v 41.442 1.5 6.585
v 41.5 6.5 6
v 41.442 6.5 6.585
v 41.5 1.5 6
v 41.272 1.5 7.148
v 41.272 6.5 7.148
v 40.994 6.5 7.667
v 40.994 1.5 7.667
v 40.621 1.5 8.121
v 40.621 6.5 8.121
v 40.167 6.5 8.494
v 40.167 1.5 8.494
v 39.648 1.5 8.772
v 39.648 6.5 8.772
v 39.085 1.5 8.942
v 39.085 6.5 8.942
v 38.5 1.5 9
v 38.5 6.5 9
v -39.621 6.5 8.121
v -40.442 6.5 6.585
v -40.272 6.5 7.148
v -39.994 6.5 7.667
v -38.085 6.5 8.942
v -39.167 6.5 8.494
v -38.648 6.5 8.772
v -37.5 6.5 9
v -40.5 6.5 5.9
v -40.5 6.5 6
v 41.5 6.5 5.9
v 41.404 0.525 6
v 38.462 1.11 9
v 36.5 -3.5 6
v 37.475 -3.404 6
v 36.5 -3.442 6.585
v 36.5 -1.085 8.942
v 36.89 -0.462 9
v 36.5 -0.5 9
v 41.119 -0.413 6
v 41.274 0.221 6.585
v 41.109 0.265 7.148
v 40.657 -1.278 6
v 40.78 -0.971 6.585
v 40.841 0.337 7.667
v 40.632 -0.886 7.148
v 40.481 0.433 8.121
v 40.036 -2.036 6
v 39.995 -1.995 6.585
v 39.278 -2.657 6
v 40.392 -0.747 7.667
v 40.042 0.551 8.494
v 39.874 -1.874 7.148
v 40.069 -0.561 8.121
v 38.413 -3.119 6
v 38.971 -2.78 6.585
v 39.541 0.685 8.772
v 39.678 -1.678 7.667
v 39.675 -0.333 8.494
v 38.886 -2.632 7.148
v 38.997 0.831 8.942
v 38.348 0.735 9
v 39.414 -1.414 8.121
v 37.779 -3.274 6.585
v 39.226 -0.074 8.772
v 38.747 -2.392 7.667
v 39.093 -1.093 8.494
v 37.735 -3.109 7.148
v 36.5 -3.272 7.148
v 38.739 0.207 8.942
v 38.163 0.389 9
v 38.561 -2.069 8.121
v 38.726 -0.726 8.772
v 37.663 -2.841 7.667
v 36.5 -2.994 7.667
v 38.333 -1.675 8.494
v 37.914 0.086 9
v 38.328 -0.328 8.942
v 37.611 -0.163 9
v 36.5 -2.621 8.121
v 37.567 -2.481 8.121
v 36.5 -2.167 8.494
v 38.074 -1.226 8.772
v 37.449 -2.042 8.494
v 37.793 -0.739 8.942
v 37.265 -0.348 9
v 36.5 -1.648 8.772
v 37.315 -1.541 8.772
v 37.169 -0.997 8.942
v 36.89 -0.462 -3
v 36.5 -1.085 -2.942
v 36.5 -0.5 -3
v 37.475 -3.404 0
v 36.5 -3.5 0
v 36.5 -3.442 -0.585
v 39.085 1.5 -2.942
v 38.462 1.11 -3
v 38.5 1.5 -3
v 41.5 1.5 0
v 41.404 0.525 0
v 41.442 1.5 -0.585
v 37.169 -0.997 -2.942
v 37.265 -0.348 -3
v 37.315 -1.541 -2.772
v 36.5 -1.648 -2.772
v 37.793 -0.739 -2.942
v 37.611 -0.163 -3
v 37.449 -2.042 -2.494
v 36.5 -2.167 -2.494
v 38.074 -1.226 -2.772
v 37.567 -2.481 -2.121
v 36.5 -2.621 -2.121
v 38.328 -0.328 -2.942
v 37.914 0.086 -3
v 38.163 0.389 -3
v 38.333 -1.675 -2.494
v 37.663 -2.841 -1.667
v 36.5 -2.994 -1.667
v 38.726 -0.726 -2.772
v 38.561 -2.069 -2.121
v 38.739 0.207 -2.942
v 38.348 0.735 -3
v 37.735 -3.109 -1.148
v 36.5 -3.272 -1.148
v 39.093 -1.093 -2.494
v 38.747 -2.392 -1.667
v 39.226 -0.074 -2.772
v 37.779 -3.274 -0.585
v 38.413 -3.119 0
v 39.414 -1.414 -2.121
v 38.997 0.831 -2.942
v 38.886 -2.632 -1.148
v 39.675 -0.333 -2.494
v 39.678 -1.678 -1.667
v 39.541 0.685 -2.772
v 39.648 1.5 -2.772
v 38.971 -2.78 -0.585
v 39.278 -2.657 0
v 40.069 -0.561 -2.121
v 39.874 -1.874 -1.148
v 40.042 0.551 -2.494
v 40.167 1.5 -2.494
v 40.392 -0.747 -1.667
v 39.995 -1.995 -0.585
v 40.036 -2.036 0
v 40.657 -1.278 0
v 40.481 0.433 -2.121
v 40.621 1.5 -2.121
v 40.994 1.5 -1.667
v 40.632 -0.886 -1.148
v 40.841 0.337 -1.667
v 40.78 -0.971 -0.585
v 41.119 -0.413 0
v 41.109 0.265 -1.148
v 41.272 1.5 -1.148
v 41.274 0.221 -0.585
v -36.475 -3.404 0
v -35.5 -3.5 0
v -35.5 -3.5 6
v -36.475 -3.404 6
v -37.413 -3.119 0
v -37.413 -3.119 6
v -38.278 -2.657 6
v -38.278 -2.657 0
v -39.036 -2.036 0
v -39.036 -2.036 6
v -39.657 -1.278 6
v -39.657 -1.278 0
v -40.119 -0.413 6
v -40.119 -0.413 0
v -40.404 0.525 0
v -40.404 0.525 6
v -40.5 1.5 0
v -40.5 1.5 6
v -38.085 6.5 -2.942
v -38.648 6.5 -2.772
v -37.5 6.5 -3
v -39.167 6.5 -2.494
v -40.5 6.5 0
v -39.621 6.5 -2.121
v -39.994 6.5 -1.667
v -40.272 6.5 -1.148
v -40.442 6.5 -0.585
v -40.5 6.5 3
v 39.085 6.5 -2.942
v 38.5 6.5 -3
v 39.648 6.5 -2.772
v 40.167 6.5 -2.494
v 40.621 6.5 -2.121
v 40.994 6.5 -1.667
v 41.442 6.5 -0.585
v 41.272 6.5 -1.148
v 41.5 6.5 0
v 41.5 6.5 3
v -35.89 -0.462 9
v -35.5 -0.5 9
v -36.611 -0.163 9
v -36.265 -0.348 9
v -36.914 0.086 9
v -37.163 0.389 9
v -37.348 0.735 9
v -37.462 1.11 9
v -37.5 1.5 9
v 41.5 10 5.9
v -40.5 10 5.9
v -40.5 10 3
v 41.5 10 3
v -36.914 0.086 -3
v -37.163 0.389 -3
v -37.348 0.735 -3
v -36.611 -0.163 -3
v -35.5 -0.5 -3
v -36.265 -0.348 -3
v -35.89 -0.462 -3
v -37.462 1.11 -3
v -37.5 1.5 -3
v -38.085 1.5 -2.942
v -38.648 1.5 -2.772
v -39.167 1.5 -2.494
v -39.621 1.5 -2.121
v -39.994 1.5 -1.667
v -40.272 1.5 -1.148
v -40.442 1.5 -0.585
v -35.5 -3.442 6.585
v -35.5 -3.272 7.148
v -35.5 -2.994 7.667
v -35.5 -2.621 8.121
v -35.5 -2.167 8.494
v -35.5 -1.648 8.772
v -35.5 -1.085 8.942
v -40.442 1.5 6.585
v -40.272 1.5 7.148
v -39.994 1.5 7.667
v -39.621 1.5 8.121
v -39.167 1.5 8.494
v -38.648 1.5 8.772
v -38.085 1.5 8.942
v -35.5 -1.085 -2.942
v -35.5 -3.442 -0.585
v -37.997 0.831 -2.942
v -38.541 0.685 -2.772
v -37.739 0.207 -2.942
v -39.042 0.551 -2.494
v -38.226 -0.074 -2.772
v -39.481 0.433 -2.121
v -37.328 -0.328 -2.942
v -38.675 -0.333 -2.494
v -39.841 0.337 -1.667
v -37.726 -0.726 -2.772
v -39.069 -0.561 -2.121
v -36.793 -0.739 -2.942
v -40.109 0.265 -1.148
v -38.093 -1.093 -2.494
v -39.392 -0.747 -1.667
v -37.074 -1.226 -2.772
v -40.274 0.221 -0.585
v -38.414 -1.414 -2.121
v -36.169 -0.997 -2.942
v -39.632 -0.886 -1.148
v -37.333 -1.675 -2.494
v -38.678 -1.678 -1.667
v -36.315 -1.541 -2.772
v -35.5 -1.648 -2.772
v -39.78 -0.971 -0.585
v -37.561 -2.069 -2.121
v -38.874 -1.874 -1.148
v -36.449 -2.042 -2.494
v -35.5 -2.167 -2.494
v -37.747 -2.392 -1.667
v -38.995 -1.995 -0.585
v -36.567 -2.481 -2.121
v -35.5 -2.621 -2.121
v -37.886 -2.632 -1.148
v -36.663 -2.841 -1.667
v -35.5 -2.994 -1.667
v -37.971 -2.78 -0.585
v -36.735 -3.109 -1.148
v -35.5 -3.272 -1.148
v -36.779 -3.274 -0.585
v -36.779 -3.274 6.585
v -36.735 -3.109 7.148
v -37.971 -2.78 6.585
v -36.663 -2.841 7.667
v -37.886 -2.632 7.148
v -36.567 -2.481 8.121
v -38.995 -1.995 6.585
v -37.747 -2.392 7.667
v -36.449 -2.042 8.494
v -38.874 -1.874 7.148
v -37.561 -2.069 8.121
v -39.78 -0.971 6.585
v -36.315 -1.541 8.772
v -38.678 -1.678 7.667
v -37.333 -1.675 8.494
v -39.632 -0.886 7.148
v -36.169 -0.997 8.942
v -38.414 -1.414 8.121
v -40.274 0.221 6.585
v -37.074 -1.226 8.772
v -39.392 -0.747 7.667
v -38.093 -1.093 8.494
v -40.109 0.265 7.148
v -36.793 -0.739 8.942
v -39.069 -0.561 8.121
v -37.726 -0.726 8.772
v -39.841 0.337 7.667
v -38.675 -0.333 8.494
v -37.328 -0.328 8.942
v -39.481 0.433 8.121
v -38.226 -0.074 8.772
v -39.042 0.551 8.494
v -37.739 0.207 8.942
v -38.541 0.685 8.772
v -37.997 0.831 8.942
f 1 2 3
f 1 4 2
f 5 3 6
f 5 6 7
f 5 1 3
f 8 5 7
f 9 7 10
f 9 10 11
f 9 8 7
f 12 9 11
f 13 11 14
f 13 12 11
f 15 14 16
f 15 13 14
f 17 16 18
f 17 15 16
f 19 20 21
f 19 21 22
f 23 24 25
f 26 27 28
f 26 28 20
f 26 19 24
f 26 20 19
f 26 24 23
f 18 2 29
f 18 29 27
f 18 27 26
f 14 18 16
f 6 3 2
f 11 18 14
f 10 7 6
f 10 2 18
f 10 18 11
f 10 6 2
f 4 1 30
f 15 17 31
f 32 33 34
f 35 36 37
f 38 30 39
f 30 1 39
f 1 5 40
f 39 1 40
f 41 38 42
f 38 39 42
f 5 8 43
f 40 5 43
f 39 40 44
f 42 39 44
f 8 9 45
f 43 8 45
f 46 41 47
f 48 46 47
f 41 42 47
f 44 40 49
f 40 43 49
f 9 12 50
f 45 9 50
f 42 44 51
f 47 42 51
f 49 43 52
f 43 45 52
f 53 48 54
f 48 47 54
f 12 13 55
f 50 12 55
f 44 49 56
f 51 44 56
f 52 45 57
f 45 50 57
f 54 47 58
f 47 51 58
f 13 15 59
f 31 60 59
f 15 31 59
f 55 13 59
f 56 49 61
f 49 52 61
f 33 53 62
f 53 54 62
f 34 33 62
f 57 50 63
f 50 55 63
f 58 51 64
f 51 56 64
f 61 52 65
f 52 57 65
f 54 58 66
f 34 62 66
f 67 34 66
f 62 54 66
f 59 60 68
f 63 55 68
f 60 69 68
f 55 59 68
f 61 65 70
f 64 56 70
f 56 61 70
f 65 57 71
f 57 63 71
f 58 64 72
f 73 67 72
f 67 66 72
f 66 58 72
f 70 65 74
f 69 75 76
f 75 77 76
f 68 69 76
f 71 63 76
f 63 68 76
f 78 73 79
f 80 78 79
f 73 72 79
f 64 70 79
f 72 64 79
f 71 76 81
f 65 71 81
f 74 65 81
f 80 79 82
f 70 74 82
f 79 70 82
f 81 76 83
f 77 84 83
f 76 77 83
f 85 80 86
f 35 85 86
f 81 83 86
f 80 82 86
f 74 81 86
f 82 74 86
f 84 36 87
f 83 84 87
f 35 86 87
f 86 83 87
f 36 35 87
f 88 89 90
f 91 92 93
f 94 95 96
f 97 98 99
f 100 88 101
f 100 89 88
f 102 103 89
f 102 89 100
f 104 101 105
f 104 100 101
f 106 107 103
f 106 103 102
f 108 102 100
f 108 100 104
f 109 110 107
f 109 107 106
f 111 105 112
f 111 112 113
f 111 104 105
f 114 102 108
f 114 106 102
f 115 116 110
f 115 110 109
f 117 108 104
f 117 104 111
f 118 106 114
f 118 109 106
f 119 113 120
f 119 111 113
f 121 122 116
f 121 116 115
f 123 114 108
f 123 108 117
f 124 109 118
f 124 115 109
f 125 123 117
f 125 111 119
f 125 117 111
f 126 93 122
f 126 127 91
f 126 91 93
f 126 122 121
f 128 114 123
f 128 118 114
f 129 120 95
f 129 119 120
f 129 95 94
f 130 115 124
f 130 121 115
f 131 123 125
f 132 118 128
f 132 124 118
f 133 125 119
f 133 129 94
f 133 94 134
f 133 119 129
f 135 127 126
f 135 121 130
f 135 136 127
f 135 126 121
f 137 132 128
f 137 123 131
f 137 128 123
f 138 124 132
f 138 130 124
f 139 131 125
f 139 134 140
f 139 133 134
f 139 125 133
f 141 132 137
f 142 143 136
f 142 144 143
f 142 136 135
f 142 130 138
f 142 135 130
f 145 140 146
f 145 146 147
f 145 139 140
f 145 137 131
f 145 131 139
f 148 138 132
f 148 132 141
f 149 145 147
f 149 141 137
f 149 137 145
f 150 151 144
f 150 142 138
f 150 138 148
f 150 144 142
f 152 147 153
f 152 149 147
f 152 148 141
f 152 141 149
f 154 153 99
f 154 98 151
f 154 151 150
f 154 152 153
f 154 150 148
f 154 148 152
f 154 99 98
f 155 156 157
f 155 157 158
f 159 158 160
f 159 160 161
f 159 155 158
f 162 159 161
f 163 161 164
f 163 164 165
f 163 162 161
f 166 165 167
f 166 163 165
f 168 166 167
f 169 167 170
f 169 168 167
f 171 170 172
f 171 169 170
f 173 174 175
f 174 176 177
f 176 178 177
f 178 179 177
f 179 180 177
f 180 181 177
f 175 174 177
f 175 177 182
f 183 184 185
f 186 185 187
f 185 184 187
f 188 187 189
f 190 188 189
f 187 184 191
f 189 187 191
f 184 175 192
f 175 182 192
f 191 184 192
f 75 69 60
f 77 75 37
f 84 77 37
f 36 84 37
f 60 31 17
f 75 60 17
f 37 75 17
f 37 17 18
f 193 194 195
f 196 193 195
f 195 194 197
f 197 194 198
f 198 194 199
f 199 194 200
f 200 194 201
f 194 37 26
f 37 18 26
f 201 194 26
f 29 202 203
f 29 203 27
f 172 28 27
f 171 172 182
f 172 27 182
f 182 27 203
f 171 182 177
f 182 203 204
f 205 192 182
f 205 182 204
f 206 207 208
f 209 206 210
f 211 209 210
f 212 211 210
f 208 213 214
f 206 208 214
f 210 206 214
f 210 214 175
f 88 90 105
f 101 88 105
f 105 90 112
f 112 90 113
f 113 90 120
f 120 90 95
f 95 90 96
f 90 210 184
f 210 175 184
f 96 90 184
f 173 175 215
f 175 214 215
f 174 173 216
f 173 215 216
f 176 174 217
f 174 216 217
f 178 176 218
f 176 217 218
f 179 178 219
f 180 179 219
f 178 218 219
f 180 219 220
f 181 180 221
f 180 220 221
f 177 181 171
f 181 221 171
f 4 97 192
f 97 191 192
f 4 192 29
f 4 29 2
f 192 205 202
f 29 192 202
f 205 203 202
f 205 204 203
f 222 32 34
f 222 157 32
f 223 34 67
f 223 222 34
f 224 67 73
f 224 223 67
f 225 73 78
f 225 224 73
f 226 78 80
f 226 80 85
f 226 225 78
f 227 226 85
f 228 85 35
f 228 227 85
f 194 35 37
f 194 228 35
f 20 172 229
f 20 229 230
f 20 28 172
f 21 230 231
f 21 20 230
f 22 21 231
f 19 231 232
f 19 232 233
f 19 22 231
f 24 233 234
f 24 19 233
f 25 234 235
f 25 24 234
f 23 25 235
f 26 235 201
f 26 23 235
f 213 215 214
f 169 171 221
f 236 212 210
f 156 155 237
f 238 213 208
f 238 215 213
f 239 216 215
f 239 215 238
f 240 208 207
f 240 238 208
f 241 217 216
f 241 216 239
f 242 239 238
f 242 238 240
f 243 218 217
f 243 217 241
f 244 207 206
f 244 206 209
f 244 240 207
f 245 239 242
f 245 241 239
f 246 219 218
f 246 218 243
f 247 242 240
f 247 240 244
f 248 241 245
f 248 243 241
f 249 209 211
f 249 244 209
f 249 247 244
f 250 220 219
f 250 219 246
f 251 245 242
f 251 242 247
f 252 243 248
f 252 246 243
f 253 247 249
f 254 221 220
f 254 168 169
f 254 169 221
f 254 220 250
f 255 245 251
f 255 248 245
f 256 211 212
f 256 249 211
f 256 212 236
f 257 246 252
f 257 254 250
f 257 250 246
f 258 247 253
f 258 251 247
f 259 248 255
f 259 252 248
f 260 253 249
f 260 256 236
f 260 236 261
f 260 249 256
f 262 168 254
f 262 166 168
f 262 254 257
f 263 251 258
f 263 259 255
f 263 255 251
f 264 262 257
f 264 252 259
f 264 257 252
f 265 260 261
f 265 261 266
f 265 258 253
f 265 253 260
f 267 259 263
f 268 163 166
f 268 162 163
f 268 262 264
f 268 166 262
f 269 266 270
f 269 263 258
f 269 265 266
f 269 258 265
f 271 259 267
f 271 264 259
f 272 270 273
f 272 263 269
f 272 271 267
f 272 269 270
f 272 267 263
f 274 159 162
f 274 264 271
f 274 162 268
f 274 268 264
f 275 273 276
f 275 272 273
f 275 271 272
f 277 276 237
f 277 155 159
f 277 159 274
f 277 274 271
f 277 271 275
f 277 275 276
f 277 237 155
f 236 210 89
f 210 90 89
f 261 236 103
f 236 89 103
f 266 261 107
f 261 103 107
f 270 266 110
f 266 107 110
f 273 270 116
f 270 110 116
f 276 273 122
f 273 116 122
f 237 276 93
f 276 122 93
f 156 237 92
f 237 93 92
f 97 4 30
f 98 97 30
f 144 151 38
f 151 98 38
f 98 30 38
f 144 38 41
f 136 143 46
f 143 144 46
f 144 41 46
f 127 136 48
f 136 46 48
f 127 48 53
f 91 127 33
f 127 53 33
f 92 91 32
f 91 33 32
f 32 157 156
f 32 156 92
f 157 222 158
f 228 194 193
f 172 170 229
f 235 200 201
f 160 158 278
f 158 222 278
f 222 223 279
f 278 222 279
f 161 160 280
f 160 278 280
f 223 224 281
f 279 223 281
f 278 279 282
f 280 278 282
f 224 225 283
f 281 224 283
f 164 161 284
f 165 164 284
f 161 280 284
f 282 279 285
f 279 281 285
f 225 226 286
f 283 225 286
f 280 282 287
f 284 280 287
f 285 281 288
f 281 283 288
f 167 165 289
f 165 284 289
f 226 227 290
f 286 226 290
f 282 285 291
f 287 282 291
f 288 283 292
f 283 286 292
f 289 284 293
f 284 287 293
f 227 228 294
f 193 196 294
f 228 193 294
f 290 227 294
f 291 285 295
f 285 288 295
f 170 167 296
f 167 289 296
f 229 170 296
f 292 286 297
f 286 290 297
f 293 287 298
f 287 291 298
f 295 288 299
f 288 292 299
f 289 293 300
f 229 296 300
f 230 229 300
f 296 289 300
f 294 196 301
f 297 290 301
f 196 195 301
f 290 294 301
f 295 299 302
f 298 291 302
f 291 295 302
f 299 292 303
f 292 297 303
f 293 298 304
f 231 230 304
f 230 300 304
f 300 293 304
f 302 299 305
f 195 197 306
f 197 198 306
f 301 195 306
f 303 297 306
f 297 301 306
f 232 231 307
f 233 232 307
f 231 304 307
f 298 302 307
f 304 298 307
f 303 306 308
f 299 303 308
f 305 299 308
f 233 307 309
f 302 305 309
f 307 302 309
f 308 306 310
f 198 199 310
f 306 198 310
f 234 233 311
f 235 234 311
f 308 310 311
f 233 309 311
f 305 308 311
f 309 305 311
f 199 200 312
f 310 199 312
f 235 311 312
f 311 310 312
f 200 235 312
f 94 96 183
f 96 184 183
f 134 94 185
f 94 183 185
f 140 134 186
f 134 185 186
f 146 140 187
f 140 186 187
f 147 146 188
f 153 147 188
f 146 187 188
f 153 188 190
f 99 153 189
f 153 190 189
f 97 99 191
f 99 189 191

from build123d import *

# Parameters (mm, degrees)
F1_DEPTH = 41.5
F2_DEPTH = 40.5
F3_DEPTH = 3
F4_DEPTH = 0.1
F5_DEPTH = 3.5
F6_R     = 5
F7_R     = 3


with BuildPart() as f1:
    # F0 (on Right) → F1 (new body)
    with BuildSketch(Plane.YZ):
        Polygon((0, 9), (0, 0), (6.5, 0), (6.5, 3), (10, 3), (10, 5.8), (6.5, 5.8), (6.5, 9), align=None)
    extrude(amount=F1_DEPTH)

    # F2 (add): a face of the model
    f2_faces = [f1.faces().sort_by_distance(p)[0] for p in [
        (0, 3.9674231332, 4.4856515373),
    ]]
    extrude(f2_faces, amount=F2_DEPTH)

    # F3 (add): a face of the model
    f3_faces = [f1.faces().sort_by_distance(p)[0] for p in [
        (0.5, 3.25, 0),
    ]]
    extrude(f3_faces, amount=F3_DEPTH)

    # F4 (add): a face of the model
    f4_faces = [f1.faces().sort_by_distance(p)[0] for p in [
        (0.5, 8.25, 5.8),
    ]]
    extrude(f4_faces, amount=F4_DEPTH)

    # F5 (add): a face of the model
    f5_faces = [f1.faces().sort_by_distance(p)[0] for p in [
        (0.5, 0, 3),
    ]]
    extrude(f5_faces, amount=F5_DEPTH)

    # F6
    f6_edges = [f1.edges().sort_by_distance(p)[0] for p in [
        (41.5, -3.5, 3),
        (-40.5, -3.5, 3),
    ]]
    fillet(f6_edges, radius=F6_R)

    # F7
    f7_edges = [f1.edges().sort_by_distance(p)[0] for p in [
        (0.5, -3.5, 9),
        (0.5, -3.5, -3),
    ]]
    fillet(f7_edges, radius=F7_R)


solid = f1.part
